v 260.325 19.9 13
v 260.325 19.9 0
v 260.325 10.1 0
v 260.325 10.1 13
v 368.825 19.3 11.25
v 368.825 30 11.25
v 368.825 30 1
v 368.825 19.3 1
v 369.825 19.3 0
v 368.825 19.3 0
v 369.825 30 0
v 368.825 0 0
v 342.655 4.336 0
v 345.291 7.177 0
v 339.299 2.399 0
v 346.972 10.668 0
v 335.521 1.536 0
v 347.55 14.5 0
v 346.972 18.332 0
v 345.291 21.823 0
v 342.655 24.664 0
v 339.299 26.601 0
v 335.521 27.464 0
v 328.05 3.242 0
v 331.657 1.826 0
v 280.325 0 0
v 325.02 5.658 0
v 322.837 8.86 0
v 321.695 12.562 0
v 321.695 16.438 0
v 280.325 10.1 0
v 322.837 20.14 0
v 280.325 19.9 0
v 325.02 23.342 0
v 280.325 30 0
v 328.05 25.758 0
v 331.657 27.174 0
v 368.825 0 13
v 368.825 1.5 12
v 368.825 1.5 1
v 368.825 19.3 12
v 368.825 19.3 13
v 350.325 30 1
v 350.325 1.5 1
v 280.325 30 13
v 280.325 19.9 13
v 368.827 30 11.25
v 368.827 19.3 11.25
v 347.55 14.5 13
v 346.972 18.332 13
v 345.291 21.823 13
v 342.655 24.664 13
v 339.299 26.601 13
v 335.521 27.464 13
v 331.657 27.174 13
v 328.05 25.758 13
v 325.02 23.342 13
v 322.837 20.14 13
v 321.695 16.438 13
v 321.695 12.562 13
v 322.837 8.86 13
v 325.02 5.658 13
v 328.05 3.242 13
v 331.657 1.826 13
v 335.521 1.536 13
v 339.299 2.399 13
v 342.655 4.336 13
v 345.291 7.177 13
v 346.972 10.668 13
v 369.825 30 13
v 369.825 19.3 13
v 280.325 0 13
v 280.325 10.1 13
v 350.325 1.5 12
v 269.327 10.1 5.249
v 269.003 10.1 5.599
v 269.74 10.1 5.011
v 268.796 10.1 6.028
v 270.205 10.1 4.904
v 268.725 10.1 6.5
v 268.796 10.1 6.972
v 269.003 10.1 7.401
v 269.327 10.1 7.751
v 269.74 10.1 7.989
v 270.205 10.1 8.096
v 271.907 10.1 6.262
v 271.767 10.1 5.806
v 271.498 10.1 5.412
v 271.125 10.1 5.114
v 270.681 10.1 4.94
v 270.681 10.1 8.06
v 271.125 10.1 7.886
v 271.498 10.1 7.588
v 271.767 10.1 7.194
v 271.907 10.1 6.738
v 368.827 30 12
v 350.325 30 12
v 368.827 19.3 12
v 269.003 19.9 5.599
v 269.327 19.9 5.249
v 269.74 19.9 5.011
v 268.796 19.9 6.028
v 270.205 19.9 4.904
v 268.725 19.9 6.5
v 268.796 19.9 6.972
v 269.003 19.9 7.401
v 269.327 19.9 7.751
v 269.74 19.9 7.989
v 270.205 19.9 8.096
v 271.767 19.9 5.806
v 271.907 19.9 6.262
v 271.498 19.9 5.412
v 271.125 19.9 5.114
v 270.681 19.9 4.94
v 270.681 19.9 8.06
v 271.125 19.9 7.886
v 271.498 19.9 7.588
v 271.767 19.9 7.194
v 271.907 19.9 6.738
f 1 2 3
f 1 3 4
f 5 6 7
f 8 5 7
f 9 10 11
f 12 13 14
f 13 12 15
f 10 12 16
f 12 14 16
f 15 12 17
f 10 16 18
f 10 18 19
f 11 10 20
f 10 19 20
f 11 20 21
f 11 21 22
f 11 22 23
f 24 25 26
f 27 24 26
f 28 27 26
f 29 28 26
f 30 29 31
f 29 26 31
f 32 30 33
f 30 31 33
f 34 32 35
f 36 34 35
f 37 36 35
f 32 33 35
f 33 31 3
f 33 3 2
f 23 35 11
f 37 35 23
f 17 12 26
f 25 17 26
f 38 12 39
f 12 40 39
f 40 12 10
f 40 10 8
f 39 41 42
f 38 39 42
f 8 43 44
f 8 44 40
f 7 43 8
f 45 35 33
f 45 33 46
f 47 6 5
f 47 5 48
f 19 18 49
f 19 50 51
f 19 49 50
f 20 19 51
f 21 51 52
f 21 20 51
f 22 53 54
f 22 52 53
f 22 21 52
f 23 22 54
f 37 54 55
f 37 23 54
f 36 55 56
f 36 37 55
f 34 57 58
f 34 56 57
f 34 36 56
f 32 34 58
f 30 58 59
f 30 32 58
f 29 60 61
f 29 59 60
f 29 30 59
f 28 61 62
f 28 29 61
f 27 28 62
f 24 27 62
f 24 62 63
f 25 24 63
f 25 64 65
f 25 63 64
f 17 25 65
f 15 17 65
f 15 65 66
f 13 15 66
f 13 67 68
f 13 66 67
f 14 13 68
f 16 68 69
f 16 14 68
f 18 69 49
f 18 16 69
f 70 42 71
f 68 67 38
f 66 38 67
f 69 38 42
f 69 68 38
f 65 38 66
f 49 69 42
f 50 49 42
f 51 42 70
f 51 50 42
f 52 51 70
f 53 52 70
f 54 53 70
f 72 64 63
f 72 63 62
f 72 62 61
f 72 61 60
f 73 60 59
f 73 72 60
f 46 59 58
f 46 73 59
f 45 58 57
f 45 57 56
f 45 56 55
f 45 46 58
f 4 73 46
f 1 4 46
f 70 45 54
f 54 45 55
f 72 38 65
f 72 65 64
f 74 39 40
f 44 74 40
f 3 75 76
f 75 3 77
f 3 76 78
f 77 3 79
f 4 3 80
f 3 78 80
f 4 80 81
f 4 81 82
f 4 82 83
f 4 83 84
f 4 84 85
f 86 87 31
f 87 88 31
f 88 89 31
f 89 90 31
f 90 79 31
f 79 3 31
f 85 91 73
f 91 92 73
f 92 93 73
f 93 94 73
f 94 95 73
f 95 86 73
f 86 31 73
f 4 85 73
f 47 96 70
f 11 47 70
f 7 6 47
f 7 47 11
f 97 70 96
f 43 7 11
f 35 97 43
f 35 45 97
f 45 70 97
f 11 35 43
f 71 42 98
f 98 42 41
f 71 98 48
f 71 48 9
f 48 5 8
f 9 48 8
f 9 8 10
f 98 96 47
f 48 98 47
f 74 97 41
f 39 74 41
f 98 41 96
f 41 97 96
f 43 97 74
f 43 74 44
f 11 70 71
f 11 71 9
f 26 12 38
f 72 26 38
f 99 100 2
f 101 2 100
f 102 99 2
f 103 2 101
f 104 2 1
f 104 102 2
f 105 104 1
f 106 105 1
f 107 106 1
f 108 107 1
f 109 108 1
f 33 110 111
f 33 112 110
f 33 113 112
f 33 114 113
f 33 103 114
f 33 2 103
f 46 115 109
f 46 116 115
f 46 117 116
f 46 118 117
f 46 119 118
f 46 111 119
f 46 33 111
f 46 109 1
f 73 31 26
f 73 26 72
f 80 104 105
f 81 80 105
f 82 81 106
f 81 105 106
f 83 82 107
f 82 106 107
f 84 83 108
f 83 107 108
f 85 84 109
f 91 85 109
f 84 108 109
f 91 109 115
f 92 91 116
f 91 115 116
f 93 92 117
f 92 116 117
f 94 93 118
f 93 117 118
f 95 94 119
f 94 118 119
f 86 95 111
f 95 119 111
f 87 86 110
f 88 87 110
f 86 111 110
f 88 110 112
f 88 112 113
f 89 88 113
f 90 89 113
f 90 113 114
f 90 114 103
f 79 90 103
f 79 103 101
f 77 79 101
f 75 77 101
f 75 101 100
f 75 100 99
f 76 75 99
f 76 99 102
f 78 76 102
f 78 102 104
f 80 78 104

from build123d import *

# Parameters (mm, degrees)
SKETCH1_W               = 355.325
SKETCH1_H               = 30
SKETCH1_R               = 12.5
SKETCH1_R_2             = 1
SKETCH1_W_2             = 50
SKETCH1_H_2             = 5
BOSS_EXTRUDE3_DEPTH     = 13
FILLET3_R               = 5
SKETCH3_R               = 12.5
BOSS_EXTRUDE4_DEPTH     = 13
CUT_EXTRUDE1_REACH      = 359.536
SKETCH4_R               = 1.425
SKETCH5_W               = 63.83
SKETCH5_H               = 18
CUT_EXTRUDE3_DEPTH      = 358.535810269
FILLET4_R               = 5
SKETCH6_W               = 63.8325
SKETCH6_H               = 17
CUT_EXTRUDE4_DEPTH      = 5
SKETCH7_R               = 2.159563788
SKETCH7_R_2             = 1
SKETCH7_R_3             = 2.117135705
SKETCH7_R_4             = 1.916104153
SKETCH7_R_5             = 2.415941568
BOSS_EXTRUDE5_DEPTH     = 8
SKETCH8_R               = 12.5
BOSS_EXTRUDE6_DEPTH     = 13
CUT_EXTRUDE5_DEPTH      = 358.535810269
CUT_EXTRUDE5_DEPTH_BACK = 358.535810269
SKETCH10_R              = 12.5
SKETCH10_R_2            = 13
SKETCH13_W              = 13
SKETCH13_H              = 30
BOSS_EXTRUDE7_DEPTH     = 5
SKETCH14_W              = 13
SKETCH14_H              = 9.8
BOSS_EXTRUDE8_DEPTH     = 5
SKETCH15_R              = 1.6
CUT_EXTRUDE6_DEPTH      = 357.119173347
SKETCH17_W              = 5
SKETCH17_H              = 30
CUT_EXTRUDE7_DEPTH      = 357.826085965
BOSS_EXTRUDE9_DEPTH     = 18.5
SKETCH19_W              = 13
SKETCH19_H              = 10.7
BOSS_EXTRUDE10_DEPTH    = 1
CUT_EXTRUDE8_REACH      = 373.267
SKETCH20_W              = 18.5
SKETCH20_H              = 0.75
SKETCH20_W_2            = 18.502042188


with BuildPart() as part:
    # Sketch1 → Boss-Extrude3 (new body)
    # profile 1 of 3: a face of its own
    with BuildSketch(Plane.XY):
        with Locations((177.6625, 15)):
            Rectangle(SKETCH1_W, SKETCH1_H)
        with Locations(Location((334.55, 14.5, 0), (0, 0, 180))):
            Circle(SKETCH1_R, mode=Mode.SUBTRACT)
        with Locations(Location((20.775, 14.5, 0), (0, 0, 180))):
            Circle(SKETCH1_R, mode=Mode.SUBTRACT)
    # profile 2 of 3: a face of its own
    with BuildSketch(Plane.XY):
        Polygon((177.6625, 0), (50, 0), (50, -5), (50, -17), (177.6625, -17), align=None)
        with Locations(Location((60, -14.5, 0), (0, 0, 180))):
            Circle(SKETCH1_R_2, mode=Mode.SUBTRACT)
        with Locations(Location((68, -14.5, 0), (0, 0, 180))):
            Circle(SKETCH1_R_2, mode=Mode.SUBTRACT)
        with Locations(Location((60, -2.5, 0), (0, 0, 180))):
            Circle(SKETCH1_R_2, mode=Mode.SUBTRACT)
        with Locations(Location((68, -2.5, 0), (0, 0, 180))):
            Circle(SKETCH1_R_2, mode=Mode.SUBTRACT)
    # profile 3 of 3: a face of its own
    with BuildSketch(Plane.XY):
        with Locations((25, -2.5)):
            Rectangle(SKETCH1_W_2, SKETCH1_H_2)
    extrude(amount=BOSS_EXTRUDE3_DEPTH)

    # Fillet3
    fillet3_edges = [part.edges().sort_by_distance(p)[0] for p in [
        (0, -5, 6.5),
        (0, 30, 6.5),
        (355.325, 30, 6.5),
        (355.325, 0, 6.5),
        (177.6625, -17, 6.5),
        (50, -17, 6.5),
    ]]
    fillet(fillet3_edges, radius=FILLET3_R)

    # Sketch3 → Boss-Extrude4 (add)
    with BuildSketch(Plane.XY.offset(13)):
        with Locations(Location((85, 14.5, 0), (0, 0, 180))):
            Circle(SKETCH3_R)
        with Locations(Location((165, 14.5, 0), (0, 0, 180))):
            Circle(SKETCH3_R)
        with Locations(Location((245, 14.5, 0), (0, 0, 180))):
            Circle(SKETCH3_R)
    extrude(amount=BOSS_EXTRUDE4_DEPTH)

    # Sketch4 → Cut-Extrude1 (cut, up to next)
    with BuildSketch(Plane(origin=(0, 0, 0), x_dir=(-1, 0, 0), z_dir=(0, 0, -1)), mode=Mode.PRIVATE) as cut_extrude1_sk1:
        with Locations((-68, -2.5)):
            Circle(SKETCH4_R)
    cut_extrude1_tool1 = extrude(cut_extrude1_sk1.sketch, amount=-CUT_EXTRUDE1_REACH, mode=Mode.PRIVATE) & part.part
    # Sketch4 → Cut-Extrude1 (cut, up to next)
    with BuildSketch(Plane(origin=(0, 0, 0), x_dir=(-1, 0, 0), z_dir=(0, 0, -1)), mode=Mode.PRIVATE) as cut_extrude1_sk2:
        with Locations((-60, -2.5)):
            Circle(SKETCH4_R)
    cut_extrude1_tool2 = extrude(cut_extrude1_sk2.sketch, amount=-CUT_EXTRUDE1_REACH, mode=Mode.PRIVATE) & part.part
    # Sketch4 → Cut-Extrude1 (cut, up to next)
    with BuildSketch(Plane(origin=(0, 0, 0), x_dir=(-1, 0, 0), z_dir=(0, 0, -1)), mode=Mode.PRIVATE) as cut_extrude1_sk3:
        with Locations((-60, -14.5)):
            Circle(SKETCH4_R)
    cut_extrude1_tool3 = extrude(cut_extrude1_sk3.sketch, amount=-CUT_EXTRUDE1_REACH, mode=Mode.PRIVATE) & part.part
    # Sketch4 → Cut-Extrude1 (cut, up to next)
    with BuildSketch(Plane(origin=(0, 0, 0), x_dir=(-1, 0, 0), z_dir=(0, 0, -1)), mode=Mode.PRIVATE) as cut_extrude1_sk4:
        with Locations((-68, -14.5)):
            Circle(SKETCH4_R)
    cut_extrude1_tool4 = extrude(cut_extrude1_sk4.sketch, amount=-CUT_EXTRUDE1_REACH, mode=Mode.PRIVATE) & part.part
    add(cut_extrude1_tool1.solids().sort_by_distance((68, -2.5, 0))[0], mode=Mode.SUBTRACT)
    add(cut_extrude1_tool2.solids().sort_by_distance((60, -2.5, 0))[0], mode=Mode.SUBTRACT)
    add(cut_extrude1_tool3.solids().sort_by_distance((60, -14.5, 0))[0], mode=Mode.SUBTRACT)
    add(cut_extrude1_tool4.solids().sort_by_distance((68, -14.5, 0))[0], mode=Mode.SUBTRACT)

    # Sketch5 → Cut-Extrude3 (cut, through all)
    with BuildSketch(Plane(origin=(0, 0, 0), x_dir=(-1, 0, 0), z_dir=(0, 0, -1))):
        with Locations((-145.7475, -9)):
            Rectangle(SKETCH5_W, SKETCH5_H)
    extrude(amount=-CUT_EXTRUDE3_DEPTH, mode=Mode.SUBTRACT)

    # Fillet4
    fillet4_edges = [part.edges().sort_by_distance(p)[0] for p in [
        (113.8325, -17, 6.5),
    ]]
    fillet(fillet4_edges, radius=FILLET4_R)

    # Sketch6 → Cut-Extrude4 (cut)
    with BuildSketch(Plane.XY.offset(13)):
        with Locations((81.91625, -8.5)):
            Rectangle(SKETCH6_W, SKETCH6_H)
    extrude(amount=-CUT_EXTRUDE4_DEPTH, mode=Mode.SUBTRACT)

    # Sketch7 → Boss-Extrude5 (add)
    # profile 1 of 4: a face of its own
    with BuildSketch(Plane.XY.offset(8)):
        with Locations((60, -14.5)):
            Circle(SKETCH7_R)
        with Locations((60, -14.5)):
            Circle(SKETCH7_R_2, mode=Mode.SUBTRACT)
    # profile 2 of 4: a face of its own
    with BuildSketch(Plane.XY.offset(8)):
        with Locations((60, -2.5)):
            Circle(SKETCH7_R_3)
        with Locations((60, -2.5)):
            Circle(SKETCH7_R_2, mode=Mode.SUBTRACT)
    # profile 3 of 4: a face of its own
    with BuildSketch(Plane.XY.offset(8)):
        with Locations((68, -2.5)):
            Circle(SKETCH7_R_4)
        with Locations((68, -2.5)):
            Circle(SKETCH7_R_2, mode=Mode.SUBTRACT)
    # profile 4 of 4: a face of its own
    with BuildSketch(Plane.XY.offset(8)):
        with Locations((68, -14.5)):
            Circle(SKETCH7_R_5)
        with Locations((68, -14.5)):
            Circle(SKETCH7_R_2, mode=Mode.SUBTRACT)
    extrude(amount=-BOSS_EXTRUDE5_DEPTH)

    # Sketch8 → Boss-Extrude6 (add)
    with BuildSketch(Plane.XY.offset(26)):
        with Locations(Location((85, 14.5, 0), (0, 0, 180))):
            Circle(SKETCH8_R)
        with Locations(Location((165, 14.5, 0), (0, 0, 180))):
            Circle(SKETCH8_R)
        with Locations(Location((245, 14.5, 0), (0, 0, 180))):
            Circle(SKETCH8_R)
    extrude(amount=BOSS_EXTRUDE6_DEPTH)

    # Sketch10 → Cut-Extrude5 (cut, two sides: drawn at the far end of the back side and taken through both)
    # profile 1 of 6: a face of its own
    with BuildSketch(Plane.XY.offset(13).offset(-CUT_EXTRUDE5_DEPTH_BACK)):
        with BuildLine():
            Line((285.325, 19.9), (285.325, 30))
            Line((285.325, 30), (5, 30))
            ThreePointArc((5, 30), (1.464466094, 28.535533906), (0, 25))
            Line((0, 25), (0, 0))
            ThreePointArc((0, 0), (1.464466094, -3.535533906), (5, -5))
            Line((5, -5), (50, -5))
            Line((50, -5), (50, 0))
            Line((50, 0), (113.8325, 0))
            Line((113.8325, 0), (285.325, 0))
            Line((285.325, 0), (285.325, 10.1))
            Line((285.325, 10.1), (265.325, 10.1))
            Line((265.325, 10.1), (265.325, 19.9))
            Line((265.325, 19.9), (285.325, 19.9))
        make_face()
        with Locations((20.775, 14.5)):
            Circle(SKETCH10_R, mode=Mode.SUBTRACT)
        with Locations((85, 14.5)):
            Circle(SKETCH10_R, mode=Mode.SUBTRACT)
        with Locations((165, 14.5)):
            Circle(SKETCH10_R, mode=Mode.SUBTRACT)
        with Locations((245, 14.5)):
            Circle(SKETCH10_R, mode=Mode.SUBTRACT)
    # profile 2 of 6: a face of its own
    with BuildSketch(Plane.XY.offset(13).offset(-CUT_EXTRUDE5_DEPTH_BACK)):
        with Locations((334.55, 14.5)):
            Circle(SKETCH10_R_2)
        with Locations((334.55, 14.5)):
            Circle(SKETCH10_R, mode=Mode.SUBTRACT)
    # profile 3 of 6: a face of its own
    with BuildSketch(Plane.XY.offset(13).offset(-CUT_EXTRUDE5_DEPTH_BACK)):
        with Locations((85, 14.5)):
            Circle(SKETCH10_R)
    # profile 4 of 6: a face of its own
    with BuildSketch(Plane.XY.offset(13).offset(-CUT_EXTRUDE5_DEPTH_BACK)):
        with Locations((165, 14.5)):
            Circle(SKETCH10_R)
    # profile 5 of 6: a face of its own
    with BuildSketch(Plane.XY.offset(13).offset(-CUT_EXTRUDE5_DEPTH_BACK)):
        with Locations((245, 14.5)):
            Circle(SKETCH10_R)
    # profile 6 of 6: a face of its own
    with BuildSketch(Plane.XY.offset(13).offset(-CUT_EXTRUDE5_DEPTH_BACK)):
        with BuildLine():
            Line((50, 0), (50, -5))
            Line((50, -5), (50, -12))
            ThreePointArc((50, -12), (51.464466094, -15.535533906), (55, -17))
            Line((55, -17), (108.8325, -17))
            ThreePointArc((108.8325, -17), (112.368033906, -15.535533906), (113.8325, -12))
            Line((113.8325, -12), (113.8325, 0))
            Line((113.8325, 0), (50, 0))
        make_face()
    extrude(amount=CUT_EXTRUDE5_DEPTH + CUT_EXTRUDE5_DEPTH_BACK, mode=Mode.SUBTRACT)

    # Sketch13 → Boss-Extrude7 (add)
    with BuildSketch(Plane.ZY.offset(-285.325)):
        with Locations((6.5, 15)):
            Rectangle(SKETCH13_W, SKETCH13_H)
    extrude(amount=BOSS_EXTRUDE7_DEPTH)

    # Sketch14 → Boss-Extrude8 (add)
    with BuildSketch(Plane.ZY.offset(-265.325)):
        with Locations((6.5, 15)):
            Rectangle(SKETCH14_W, SKETCH14_H)
    extrude(amount=BOSS_EXTRUDE8_DEPTH)

    # Sketch15 → Cut-Extrude6 (cut, through all)
    with BuildSketch(Plane(origin=(0, 19.9, 0), x_dir=(1, 0, 0), z_dir=(0, 1, 0))):
        with Locations(Location((270.325, -6.5, 0), (0, 0, 180))):
            Circle(SKETCH15_R)
    extrude(amount=-CUT_EXTRUDE6_DEPTH, mode=Mode.SUBTRACT)

    # Sketch17 → Cut-Extrude7 (cut, through all)
    with BuildSketch(Plane.XY.offset(13)):
        with Locations((352.825, 15)):
            Rectangle(SKETCH17_W, SKETCH17_H)
    extrude(amount=-CUT_EXTRUDE7_DEPTH, mode=Mode.SUBTRACT)

    # Sketch18 → Boss-Extrude9 (add)
    with BuildSketch(Plane(origin=(350.325, 0, 0), x_dir=(0, 0, -1), z_dir=(1, 0, 0))):
        Polygon((-11.25, 30), (-11.25, 1.5), (-1.75, 1.5), (-1.75, 30), (0, 30), (0, 0), (-13, 0), (-13, 30), align=None)
    extrude(amount=BOSS_EXTRUDE9_DEPTH)

    # Sketch19 → Boss-Extrude10 (add)
    with BuildSketch(Plane(origin=(368.825, 0, 0), x_dir=(0, 0, -1), z_dir=(1, 0, 0))):
        with Locations((-6.5, 24.65)):
            Rectangle(SKETCH19_W, SKETCH19_H)
    extrude(amount=BOSS_EXTRUDE10_DEPTH)

    # Cut-Extrude8: up to this face of the body (flat: up to its plane)
    cut_extrude8_end = Plane(part.part.faces().sort_by_distance((359.575, 1.5, 6.5))[0])
    # Sketch20 → Cut-Extrude8 (cut, up to the picked face)
    with BuildSketch(Plane(origin=(0, 30, 0), x_dir=(1, 0, 0), z_dir=(0, 1, 0)), mode=Mode.PRIVATE) as cut_extrude8_sk1:
        with Locations((359.575, -1.375)):
            Rectangle(SKETCH20_W, SKETCH20_H)
    cut_extrude8_tool1 = split(extrude(cut_extrude8_sk1.sketch, amount=-CUT_EXTRUDE8_REACH, mode=Mode.PRIVATE), bisect_by=cut_extrude8_end, keep=Keep.BOTH, mode=Mode.PRIVATE)
    # Sketch20 → Cut-Extrude8 (cut, up to the picked face)
    with BuildSketch(Plane(origin=(0, 30, 0), x_dir=(1, 0, 0), z_dir=(0, 1, 0)), mode=Mode.PRIVATE) as cut_extrude8_sk2:
        with Locations((359.576021094, -11.625)):
            Rectangle(SKETCH20_W_2, SKETCH20_H)
    cut_extrude8_tool2 = split(extrude(cut_extrude8_sk2.sketch, amount=-CUT_EXTRUDE8_REACH, mode=Mode.PRIVATE), bisect_by=cut_extrude8_end, keep=Keep.BOTH, mode=Mode.PRIVATE)
    add(cut_extrude8_tool1.solids().sort_by(Axis((359.575, 30, 1.375), (0, -1, 0)))[0], mode=Mode.SUBTRACT)
    add(cut_extrude8_tool2.solids().sort_by(Axis((359.576021, 30, 11.625), (0, -1, 0)))[0], mode=Mode.SUBTRACT)


solid = part.part
